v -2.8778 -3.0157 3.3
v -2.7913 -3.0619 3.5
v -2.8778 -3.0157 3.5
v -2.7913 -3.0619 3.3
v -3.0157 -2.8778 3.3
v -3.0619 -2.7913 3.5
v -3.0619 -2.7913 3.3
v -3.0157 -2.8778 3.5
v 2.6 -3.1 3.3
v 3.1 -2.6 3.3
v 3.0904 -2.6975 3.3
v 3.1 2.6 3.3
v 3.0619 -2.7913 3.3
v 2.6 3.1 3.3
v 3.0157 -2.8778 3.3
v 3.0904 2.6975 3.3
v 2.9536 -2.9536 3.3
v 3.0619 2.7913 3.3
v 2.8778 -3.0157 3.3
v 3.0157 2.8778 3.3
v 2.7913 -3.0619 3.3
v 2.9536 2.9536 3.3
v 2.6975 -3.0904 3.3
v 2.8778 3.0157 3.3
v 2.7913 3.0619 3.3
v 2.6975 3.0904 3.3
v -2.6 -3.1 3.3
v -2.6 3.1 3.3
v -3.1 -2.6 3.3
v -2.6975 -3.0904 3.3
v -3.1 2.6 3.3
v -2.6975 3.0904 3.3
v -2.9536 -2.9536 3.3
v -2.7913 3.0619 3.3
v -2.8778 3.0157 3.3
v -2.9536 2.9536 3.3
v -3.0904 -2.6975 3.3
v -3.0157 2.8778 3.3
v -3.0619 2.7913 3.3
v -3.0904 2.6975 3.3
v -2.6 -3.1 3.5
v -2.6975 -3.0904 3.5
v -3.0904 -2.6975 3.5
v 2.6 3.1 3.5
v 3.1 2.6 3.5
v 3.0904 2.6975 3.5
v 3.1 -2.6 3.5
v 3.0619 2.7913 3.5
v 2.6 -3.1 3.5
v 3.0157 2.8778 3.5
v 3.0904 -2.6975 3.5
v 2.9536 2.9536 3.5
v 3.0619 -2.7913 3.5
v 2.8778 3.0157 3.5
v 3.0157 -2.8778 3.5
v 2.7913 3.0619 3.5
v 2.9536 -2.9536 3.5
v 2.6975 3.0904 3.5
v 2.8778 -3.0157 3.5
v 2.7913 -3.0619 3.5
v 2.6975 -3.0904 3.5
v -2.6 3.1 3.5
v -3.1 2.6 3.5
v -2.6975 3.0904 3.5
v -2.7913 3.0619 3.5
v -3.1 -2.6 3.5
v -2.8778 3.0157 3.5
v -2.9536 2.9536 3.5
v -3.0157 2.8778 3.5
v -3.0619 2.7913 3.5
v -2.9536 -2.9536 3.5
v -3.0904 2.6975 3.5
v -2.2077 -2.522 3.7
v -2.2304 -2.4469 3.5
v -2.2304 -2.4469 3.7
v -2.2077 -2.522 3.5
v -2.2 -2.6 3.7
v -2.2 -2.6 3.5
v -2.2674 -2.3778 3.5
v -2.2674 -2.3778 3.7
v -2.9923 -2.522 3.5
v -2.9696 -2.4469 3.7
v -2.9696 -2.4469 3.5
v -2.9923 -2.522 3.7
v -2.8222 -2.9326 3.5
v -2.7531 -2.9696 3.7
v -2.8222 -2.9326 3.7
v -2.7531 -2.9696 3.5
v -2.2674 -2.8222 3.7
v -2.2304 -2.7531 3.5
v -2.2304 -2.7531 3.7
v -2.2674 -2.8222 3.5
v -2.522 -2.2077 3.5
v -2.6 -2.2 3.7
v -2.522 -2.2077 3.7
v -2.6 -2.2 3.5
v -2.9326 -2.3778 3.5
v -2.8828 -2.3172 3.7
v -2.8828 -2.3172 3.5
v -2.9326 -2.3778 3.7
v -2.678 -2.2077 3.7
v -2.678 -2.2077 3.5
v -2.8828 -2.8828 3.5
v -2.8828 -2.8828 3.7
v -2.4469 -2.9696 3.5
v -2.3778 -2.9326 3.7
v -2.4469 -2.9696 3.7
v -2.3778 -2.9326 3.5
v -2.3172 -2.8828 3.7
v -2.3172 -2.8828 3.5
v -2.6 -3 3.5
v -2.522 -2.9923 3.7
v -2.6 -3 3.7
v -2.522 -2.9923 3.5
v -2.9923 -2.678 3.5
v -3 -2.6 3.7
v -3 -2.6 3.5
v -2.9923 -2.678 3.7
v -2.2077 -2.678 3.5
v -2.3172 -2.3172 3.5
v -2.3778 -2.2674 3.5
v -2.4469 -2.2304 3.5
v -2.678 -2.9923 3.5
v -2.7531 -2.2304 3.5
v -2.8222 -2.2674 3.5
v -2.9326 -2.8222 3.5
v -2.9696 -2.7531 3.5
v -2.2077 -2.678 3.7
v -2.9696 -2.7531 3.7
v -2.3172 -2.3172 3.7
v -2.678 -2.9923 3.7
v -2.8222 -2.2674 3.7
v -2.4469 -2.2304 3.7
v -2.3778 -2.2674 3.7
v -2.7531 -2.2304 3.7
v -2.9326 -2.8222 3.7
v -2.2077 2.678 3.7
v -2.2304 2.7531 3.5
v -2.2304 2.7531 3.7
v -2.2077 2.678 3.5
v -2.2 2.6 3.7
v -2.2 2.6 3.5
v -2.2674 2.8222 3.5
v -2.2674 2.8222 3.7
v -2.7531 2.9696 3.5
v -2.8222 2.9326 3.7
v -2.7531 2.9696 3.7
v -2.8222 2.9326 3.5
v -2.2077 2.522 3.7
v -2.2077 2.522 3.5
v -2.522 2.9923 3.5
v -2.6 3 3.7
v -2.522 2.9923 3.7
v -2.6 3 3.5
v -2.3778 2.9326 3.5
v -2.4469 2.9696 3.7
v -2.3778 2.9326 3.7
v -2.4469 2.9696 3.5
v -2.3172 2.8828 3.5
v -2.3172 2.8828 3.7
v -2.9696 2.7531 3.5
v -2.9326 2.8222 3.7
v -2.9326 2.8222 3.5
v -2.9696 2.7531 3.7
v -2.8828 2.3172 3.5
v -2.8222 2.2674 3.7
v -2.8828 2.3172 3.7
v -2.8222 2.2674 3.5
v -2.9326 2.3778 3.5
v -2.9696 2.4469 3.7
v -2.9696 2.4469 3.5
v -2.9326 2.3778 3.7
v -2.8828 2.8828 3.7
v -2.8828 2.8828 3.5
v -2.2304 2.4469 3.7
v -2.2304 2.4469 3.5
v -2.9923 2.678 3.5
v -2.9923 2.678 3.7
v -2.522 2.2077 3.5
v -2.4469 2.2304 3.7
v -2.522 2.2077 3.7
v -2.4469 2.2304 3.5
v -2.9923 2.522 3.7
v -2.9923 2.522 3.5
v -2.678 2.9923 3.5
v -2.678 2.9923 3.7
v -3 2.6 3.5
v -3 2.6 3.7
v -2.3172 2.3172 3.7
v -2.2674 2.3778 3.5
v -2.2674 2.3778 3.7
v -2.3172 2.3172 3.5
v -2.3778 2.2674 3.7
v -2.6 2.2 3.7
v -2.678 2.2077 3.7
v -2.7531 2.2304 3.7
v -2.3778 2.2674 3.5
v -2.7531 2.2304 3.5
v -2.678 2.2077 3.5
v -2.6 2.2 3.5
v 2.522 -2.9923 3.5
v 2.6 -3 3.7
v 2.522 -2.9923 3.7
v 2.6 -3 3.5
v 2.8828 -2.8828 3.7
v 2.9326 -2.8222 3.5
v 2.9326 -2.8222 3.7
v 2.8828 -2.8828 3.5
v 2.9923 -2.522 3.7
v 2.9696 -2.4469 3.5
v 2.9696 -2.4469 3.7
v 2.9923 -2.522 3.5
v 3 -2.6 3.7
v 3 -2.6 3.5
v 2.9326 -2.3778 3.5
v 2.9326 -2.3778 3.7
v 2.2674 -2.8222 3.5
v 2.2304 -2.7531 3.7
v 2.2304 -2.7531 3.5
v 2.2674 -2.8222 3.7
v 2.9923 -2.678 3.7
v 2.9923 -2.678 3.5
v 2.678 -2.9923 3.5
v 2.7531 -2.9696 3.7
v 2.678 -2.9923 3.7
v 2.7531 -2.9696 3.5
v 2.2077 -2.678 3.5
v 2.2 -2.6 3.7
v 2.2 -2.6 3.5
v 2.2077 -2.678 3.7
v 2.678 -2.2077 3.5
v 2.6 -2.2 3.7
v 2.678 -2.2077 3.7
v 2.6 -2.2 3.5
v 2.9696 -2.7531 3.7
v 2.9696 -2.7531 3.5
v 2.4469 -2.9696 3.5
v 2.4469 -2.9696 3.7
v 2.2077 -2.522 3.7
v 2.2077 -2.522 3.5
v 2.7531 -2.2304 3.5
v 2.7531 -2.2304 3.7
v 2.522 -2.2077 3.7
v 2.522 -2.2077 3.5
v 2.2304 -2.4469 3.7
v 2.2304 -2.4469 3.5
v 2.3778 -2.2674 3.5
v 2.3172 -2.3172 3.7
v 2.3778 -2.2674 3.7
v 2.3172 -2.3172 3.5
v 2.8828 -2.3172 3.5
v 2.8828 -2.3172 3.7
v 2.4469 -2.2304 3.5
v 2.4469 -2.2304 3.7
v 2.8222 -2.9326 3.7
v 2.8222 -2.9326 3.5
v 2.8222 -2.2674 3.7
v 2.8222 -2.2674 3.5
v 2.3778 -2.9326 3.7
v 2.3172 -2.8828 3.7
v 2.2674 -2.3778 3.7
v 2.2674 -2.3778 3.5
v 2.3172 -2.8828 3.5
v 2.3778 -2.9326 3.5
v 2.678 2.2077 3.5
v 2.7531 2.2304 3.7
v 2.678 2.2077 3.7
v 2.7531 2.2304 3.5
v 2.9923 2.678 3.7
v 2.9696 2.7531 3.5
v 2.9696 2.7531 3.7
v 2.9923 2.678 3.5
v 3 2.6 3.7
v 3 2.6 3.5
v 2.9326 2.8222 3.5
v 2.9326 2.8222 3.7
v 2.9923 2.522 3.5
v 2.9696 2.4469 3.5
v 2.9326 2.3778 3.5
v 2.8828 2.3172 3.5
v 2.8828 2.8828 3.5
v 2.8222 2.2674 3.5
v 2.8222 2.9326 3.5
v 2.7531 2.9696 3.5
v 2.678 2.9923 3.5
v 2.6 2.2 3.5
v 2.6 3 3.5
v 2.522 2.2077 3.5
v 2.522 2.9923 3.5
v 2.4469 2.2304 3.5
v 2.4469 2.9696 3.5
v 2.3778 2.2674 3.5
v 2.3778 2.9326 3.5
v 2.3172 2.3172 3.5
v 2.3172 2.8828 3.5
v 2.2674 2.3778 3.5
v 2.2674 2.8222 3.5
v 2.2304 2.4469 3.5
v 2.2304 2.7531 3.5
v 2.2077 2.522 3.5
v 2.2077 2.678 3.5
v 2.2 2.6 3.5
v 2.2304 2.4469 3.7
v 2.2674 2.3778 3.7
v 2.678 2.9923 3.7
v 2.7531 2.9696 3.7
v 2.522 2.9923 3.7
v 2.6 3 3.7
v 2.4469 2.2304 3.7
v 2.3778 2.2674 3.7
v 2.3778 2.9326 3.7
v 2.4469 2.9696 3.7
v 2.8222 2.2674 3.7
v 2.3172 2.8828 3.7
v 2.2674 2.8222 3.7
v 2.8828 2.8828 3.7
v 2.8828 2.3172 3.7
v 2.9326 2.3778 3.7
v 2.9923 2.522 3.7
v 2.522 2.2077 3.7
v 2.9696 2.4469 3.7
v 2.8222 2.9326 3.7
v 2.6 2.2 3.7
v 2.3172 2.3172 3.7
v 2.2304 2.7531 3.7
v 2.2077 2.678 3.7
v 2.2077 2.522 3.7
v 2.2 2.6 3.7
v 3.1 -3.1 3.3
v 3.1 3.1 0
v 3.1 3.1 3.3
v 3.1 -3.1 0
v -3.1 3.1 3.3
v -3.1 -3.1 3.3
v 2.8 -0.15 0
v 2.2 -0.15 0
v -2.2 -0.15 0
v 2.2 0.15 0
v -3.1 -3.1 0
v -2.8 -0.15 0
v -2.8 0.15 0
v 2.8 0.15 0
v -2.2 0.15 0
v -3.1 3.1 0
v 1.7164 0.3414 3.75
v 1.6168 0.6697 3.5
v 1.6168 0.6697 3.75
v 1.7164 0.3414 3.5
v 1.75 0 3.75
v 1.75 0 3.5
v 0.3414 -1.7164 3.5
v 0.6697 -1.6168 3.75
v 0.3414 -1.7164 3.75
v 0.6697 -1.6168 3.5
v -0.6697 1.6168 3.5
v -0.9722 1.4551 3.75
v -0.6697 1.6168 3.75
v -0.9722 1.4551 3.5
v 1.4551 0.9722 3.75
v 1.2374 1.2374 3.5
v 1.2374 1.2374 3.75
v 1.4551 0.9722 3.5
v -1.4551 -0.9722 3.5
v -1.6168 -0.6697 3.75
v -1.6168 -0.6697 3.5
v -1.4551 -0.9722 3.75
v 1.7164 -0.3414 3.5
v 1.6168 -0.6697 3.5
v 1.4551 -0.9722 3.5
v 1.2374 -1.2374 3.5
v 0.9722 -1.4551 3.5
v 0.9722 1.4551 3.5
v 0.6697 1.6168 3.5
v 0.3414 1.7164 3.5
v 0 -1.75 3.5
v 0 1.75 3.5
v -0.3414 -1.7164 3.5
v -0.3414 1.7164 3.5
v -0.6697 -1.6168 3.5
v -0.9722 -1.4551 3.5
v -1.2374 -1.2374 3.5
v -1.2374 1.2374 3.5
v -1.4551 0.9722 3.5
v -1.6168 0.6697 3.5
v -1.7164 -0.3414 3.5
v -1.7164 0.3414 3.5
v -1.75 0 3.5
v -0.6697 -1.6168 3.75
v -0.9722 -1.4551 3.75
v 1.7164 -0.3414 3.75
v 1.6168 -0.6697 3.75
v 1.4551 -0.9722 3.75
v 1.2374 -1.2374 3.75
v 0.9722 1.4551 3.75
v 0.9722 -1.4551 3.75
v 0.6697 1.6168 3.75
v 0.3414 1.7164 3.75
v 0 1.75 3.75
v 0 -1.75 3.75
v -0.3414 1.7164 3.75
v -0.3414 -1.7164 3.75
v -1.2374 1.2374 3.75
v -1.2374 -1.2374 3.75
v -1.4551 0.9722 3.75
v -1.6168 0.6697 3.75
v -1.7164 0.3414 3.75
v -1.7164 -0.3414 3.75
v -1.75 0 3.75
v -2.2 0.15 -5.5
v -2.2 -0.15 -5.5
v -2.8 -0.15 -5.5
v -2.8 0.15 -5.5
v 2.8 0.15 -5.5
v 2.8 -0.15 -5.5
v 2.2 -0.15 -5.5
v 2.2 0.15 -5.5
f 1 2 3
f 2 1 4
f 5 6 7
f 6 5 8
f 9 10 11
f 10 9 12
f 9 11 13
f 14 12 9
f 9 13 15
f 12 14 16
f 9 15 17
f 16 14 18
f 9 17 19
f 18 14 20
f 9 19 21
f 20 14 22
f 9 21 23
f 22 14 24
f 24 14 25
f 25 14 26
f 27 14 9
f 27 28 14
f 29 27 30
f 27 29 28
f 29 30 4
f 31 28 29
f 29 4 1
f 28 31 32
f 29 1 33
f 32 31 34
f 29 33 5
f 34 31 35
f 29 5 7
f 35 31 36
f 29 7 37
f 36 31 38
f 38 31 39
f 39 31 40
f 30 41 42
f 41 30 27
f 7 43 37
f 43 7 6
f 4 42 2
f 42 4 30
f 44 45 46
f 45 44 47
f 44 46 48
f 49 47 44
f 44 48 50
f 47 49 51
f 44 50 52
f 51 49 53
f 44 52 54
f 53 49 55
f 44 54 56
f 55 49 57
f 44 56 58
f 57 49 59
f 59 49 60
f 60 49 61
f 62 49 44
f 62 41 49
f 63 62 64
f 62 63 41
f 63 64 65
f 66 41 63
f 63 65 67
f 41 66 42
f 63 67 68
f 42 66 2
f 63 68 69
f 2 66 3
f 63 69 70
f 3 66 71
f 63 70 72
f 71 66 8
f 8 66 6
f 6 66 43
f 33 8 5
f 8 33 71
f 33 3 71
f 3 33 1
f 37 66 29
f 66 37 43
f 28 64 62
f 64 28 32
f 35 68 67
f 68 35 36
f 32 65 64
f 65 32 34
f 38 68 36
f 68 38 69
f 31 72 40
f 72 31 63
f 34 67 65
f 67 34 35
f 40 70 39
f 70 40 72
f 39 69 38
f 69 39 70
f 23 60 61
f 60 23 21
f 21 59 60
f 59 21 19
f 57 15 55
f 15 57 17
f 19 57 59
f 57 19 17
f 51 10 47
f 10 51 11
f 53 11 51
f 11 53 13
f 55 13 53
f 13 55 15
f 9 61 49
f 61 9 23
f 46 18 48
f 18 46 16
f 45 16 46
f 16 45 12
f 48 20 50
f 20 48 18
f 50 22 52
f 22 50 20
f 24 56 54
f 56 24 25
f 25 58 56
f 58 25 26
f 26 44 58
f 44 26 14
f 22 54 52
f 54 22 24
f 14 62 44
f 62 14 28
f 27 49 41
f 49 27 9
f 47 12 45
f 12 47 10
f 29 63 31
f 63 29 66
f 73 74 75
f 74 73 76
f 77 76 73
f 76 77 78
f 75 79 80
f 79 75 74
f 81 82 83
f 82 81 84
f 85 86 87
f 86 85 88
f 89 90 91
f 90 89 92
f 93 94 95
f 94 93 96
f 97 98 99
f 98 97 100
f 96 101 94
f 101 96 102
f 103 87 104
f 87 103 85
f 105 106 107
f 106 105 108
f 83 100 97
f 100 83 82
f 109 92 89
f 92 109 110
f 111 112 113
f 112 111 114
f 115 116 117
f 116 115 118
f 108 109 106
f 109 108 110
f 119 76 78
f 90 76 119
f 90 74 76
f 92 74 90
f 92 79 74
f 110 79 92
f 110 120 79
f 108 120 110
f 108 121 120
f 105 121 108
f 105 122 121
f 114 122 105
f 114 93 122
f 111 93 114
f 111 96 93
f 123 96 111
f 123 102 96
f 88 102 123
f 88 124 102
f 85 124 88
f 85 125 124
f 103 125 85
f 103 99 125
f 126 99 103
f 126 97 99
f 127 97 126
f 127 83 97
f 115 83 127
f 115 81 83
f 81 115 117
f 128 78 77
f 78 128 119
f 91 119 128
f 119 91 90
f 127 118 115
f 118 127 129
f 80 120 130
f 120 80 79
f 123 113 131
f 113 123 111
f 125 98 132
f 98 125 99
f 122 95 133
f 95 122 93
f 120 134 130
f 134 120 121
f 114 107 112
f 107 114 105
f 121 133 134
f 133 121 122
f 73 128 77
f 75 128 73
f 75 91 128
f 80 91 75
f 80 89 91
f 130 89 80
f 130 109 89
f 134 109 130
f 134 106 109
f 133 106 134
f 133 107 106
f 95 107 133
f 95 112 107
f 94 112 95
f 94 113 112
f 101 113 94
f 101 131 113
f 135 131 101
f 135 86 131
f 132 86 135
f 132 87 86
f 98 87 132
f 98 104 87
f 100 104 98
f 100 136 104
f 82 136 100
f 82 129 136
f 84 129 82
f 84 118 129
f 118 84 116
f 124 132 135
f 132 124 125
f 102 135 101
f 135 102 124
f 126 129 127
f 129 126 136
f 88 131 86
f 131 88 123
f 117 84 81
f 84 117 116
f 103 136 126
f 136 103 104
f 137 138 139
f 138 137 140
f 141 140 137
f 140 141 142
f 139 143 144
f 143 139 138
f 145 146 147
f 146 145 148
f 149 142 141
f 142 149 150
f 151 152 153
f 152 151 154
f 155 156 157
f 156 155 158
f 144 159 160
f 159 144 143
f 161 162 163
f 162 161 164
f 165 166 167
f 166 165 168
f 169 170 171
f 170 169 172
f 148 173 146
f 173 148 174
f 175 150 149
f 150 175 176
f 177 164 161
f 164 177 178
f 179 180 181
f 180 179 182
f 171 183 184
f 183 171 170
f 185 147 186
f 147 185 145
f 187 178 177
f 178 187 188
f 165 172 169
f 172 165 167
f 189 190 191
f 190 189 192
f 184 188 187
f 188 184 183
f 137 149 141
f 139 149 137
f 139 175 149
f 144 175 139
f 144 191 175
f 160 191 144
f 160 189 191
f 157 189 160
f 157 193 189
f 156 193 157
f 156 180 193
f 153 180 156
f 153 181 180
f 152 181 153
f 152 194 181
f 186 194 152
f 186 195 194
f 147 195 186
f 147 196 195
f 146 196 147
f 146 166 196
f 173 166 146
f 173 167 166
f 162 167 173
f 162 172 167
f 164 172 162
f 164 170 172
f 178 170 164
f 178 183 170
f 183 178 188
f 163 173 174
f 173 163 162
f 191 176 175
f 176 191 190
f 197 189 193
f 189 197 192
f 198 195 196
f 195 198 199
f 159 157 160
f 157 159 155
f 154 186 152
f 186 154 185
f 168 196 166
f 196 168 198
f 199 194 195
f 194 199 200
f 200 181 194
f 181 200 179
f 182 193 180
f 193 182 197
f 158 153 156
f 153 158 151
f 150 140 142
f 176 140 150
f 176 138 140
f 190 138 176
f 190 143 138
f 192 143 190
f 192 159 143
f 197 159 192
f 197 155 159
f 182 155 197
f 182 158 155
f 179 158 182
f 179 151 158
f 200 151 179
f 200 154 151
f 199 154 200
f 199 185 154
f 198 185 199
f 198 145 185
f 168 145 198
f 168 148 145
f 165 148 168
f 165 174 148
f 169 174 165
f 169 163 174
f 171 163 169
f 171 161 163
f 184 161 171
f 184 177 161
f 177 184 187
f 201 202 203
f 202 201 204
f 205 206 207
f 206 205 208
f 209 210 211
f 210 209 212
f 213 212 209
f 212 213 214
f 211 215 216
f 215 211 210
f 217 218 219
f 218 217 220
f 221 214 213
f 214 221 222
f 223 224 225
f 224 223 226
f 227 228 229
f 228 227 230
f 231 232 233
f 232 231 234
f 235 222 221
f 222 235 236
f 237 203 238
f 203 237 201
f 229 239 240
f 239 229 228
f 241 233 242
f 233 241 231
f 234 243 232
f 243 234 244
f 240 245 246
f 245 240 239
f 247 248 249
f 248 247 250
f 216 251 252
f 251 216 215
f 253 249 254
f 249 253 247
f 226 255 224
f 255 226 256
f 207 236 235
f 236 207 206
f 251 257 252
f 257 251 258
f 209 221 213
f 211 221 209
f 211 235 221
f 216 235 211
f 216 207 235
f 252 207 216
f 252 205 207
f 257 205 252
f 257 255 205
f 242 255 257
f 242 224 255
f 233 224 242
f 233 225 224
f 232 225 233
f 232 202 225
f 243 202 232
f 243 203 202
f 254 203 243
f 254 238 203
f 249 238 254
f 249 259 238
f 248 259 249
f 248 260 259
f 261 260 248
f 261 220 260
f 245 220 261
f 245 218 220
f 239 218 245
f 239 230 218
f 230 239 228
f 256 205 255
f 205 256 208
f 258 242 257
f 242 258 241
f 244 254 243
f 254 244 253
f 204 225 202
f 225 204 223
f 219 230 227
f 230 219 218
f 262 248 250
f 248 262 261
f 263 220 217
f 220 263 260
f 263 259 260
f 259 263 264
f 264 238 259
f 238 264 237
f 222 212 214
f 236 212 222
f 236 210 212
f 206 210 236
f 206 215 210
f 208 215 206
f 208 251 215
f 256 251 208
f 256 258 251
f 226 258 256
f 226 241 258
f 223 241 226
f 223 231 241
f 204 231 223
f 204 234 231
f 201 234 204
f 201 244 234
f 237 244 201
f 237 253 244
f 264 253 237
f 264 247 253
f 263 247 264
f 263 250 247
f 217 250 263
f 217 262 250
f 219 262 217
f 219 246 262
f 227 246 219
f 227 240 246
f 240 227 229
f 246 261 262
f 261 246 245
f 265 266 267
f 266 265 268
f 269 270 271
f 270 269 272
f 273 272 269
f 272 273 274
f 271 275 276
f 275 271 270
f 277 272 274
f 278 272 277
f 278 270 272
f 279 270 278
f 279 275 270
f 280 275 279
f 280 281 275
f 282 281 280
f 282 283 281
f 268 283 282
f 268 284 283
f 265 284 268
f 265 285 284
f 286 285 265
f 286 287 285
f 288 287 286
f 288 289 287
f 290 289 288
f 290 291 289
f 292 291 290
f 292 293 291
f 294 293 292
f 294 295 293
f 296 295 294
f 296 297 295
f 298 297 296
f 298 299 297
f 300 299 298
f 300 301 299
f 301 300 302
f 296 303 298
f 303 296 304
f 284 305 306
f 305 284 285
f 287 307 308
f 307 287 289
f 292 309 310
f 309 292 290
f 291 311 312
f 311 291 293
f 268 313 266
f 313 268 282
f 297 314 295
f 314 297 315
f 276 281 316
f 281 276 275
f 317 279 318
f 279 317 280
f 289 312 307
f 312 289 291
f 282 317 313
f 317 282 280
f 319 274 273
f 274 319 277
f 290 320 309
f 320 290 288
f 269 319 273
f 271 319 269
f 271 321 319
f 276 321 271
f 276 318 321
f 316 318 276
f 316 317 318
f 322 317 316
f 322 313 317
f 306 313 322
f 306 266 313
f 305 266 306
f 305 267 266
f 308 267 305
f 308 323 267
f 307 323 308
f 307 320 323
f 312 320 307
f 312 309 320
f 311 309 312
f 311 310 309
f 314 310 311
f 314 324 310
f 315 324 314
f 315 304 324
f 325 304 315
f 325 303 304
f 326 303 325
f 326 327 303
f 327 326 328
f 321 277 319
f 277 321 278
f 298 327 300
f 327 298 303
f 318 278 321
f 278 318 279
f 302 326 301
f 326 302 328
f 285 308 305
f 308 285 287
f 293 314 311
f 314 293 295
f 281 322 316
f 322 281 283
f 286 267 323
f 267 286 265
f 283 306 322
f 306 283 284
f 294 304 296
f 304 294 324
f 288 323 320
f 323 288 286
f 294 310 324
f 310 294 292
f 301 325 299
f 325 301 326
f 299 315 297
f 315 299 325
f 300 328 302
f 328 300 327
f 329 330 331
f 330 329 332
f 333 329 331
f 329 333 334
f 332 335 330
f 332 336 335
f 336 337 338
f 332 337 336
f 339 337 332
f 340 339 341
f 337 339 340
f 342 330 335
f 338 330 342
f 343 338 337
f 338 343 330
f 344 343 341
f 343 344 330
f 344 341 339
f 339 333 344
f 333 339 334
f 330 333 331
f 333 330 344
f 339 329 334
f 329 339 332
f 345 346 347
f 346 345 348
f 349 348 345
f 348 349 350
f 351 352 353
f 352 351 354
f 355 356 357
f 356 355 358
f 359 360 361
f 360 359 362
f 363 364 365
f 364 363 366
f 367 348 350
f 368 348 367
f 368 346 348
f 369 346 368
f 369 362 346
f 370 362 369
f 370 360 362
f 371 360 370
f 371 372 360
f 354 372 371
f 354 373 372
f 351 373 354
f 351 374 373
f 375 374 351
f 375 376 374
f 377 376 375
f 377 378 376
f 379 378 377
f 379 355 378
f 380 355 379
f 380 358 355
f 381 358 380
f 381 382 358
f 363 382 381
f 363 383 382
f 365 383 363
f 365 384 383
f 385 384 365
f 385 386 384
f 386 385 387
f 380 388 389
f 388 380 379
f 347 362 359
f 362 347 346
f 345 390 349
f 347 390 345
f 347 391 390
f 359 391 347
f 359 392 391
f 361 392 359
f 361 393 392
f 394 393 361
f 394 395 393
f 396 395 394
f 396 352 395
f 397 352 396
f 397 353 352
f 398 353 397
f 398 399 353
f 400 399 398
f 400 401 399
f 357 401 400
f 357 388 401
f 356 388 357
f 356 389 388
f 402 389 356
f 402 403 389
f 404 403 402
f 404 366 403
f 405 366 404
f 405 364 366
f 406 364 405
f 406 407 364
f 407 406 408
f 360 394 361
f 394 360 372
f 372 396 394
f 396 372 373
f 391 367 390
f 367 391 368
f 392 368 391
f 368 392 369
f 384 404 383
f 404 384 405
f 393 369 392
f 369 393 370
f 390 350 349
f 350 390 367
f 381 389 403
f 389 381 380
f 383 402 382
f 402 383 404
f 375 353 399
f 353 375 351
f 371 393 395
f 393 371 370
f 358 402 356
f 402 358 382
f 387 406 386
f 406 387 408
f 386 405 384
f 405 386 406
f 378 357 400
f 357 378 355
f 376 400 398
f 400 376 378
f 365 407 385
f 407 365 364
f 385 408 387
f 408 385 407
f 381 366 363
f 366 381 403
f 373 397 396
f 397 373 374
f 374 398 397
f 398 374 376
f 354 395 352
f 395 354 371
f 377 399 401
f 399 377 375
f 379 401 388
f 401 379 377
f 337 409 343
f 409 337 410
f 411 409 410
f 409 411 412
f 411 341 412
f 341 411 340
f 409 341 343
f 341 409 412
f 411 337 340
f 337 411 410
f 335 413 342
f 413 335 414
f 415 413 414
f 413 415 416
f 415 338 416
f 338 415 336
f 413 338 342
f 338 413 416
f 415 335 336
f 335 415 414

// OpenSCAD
$fn = 32;

bod_x = 6.2;
bod_y = 6.2;
bod_z = 3.5;

plu_d = 3.5;
plu_z = 0.8;

plt_t = 0.2;
plt_r = 0.5;

pin_x = 0.6;
pin_y = 0.3;
pin_z = 5.5;

module body() {
     translate( [-bod_x/2, -bod_y/2, 0])
	  color("black")
	  cube( [bod_x, bod_y, bod_z-plt_t]);
}

cornerz = [ for ( x = [-bod_x/2+plt_r, bod_x/2-plt_r]) 
	   for( y = [-bod_x/2+plt_r, bod_x/2-plt_r]) [x, y] ];

module plate() {
     translate( [0, 0, bod_z-plt_t])
     color("lightgray")
     union() {
	  for( p = cornerz) {
	       translate( [ p[0], p[1], 0])
	       cylinder( d=2*plt_r, h=plt_t);
	  }
	  translate( [-bod_x/2+plt_r, -bod_y/2, 0])
	       cube( [bod_x-2*plt_r, bod_y, plt_t]);
	  translate( [-bod_x/2, -bod_y/2+plt_r, 0])
	       cube( [bod_x, bod_y-2*plt_r, plt_t]);
     }
     translate( [0, 0, bod_z]) {
	  for( p = cornerz) {
	       translate( [ p[0], p[1], 0])	       
		    color("black")
		    cylinder( d=0.8, h=0.2);
	  }
     }
}


module pin_at(x,y) {
     translate( [x-pin_x/2, y-pin_y/2, -pin_z])
	  cube( [pin_x, pin_y, pin_z]);
}

module plunger() {
     translate( [0, 0, bod_z])
	  color("black")
	  cylinder( d=3.5, h=0.25);
}

module switch() {
     body();
     plate();
     plunger();
     pin_at( -2.5, 0);
     pin_at( 2.5, 0);
}


switch();
